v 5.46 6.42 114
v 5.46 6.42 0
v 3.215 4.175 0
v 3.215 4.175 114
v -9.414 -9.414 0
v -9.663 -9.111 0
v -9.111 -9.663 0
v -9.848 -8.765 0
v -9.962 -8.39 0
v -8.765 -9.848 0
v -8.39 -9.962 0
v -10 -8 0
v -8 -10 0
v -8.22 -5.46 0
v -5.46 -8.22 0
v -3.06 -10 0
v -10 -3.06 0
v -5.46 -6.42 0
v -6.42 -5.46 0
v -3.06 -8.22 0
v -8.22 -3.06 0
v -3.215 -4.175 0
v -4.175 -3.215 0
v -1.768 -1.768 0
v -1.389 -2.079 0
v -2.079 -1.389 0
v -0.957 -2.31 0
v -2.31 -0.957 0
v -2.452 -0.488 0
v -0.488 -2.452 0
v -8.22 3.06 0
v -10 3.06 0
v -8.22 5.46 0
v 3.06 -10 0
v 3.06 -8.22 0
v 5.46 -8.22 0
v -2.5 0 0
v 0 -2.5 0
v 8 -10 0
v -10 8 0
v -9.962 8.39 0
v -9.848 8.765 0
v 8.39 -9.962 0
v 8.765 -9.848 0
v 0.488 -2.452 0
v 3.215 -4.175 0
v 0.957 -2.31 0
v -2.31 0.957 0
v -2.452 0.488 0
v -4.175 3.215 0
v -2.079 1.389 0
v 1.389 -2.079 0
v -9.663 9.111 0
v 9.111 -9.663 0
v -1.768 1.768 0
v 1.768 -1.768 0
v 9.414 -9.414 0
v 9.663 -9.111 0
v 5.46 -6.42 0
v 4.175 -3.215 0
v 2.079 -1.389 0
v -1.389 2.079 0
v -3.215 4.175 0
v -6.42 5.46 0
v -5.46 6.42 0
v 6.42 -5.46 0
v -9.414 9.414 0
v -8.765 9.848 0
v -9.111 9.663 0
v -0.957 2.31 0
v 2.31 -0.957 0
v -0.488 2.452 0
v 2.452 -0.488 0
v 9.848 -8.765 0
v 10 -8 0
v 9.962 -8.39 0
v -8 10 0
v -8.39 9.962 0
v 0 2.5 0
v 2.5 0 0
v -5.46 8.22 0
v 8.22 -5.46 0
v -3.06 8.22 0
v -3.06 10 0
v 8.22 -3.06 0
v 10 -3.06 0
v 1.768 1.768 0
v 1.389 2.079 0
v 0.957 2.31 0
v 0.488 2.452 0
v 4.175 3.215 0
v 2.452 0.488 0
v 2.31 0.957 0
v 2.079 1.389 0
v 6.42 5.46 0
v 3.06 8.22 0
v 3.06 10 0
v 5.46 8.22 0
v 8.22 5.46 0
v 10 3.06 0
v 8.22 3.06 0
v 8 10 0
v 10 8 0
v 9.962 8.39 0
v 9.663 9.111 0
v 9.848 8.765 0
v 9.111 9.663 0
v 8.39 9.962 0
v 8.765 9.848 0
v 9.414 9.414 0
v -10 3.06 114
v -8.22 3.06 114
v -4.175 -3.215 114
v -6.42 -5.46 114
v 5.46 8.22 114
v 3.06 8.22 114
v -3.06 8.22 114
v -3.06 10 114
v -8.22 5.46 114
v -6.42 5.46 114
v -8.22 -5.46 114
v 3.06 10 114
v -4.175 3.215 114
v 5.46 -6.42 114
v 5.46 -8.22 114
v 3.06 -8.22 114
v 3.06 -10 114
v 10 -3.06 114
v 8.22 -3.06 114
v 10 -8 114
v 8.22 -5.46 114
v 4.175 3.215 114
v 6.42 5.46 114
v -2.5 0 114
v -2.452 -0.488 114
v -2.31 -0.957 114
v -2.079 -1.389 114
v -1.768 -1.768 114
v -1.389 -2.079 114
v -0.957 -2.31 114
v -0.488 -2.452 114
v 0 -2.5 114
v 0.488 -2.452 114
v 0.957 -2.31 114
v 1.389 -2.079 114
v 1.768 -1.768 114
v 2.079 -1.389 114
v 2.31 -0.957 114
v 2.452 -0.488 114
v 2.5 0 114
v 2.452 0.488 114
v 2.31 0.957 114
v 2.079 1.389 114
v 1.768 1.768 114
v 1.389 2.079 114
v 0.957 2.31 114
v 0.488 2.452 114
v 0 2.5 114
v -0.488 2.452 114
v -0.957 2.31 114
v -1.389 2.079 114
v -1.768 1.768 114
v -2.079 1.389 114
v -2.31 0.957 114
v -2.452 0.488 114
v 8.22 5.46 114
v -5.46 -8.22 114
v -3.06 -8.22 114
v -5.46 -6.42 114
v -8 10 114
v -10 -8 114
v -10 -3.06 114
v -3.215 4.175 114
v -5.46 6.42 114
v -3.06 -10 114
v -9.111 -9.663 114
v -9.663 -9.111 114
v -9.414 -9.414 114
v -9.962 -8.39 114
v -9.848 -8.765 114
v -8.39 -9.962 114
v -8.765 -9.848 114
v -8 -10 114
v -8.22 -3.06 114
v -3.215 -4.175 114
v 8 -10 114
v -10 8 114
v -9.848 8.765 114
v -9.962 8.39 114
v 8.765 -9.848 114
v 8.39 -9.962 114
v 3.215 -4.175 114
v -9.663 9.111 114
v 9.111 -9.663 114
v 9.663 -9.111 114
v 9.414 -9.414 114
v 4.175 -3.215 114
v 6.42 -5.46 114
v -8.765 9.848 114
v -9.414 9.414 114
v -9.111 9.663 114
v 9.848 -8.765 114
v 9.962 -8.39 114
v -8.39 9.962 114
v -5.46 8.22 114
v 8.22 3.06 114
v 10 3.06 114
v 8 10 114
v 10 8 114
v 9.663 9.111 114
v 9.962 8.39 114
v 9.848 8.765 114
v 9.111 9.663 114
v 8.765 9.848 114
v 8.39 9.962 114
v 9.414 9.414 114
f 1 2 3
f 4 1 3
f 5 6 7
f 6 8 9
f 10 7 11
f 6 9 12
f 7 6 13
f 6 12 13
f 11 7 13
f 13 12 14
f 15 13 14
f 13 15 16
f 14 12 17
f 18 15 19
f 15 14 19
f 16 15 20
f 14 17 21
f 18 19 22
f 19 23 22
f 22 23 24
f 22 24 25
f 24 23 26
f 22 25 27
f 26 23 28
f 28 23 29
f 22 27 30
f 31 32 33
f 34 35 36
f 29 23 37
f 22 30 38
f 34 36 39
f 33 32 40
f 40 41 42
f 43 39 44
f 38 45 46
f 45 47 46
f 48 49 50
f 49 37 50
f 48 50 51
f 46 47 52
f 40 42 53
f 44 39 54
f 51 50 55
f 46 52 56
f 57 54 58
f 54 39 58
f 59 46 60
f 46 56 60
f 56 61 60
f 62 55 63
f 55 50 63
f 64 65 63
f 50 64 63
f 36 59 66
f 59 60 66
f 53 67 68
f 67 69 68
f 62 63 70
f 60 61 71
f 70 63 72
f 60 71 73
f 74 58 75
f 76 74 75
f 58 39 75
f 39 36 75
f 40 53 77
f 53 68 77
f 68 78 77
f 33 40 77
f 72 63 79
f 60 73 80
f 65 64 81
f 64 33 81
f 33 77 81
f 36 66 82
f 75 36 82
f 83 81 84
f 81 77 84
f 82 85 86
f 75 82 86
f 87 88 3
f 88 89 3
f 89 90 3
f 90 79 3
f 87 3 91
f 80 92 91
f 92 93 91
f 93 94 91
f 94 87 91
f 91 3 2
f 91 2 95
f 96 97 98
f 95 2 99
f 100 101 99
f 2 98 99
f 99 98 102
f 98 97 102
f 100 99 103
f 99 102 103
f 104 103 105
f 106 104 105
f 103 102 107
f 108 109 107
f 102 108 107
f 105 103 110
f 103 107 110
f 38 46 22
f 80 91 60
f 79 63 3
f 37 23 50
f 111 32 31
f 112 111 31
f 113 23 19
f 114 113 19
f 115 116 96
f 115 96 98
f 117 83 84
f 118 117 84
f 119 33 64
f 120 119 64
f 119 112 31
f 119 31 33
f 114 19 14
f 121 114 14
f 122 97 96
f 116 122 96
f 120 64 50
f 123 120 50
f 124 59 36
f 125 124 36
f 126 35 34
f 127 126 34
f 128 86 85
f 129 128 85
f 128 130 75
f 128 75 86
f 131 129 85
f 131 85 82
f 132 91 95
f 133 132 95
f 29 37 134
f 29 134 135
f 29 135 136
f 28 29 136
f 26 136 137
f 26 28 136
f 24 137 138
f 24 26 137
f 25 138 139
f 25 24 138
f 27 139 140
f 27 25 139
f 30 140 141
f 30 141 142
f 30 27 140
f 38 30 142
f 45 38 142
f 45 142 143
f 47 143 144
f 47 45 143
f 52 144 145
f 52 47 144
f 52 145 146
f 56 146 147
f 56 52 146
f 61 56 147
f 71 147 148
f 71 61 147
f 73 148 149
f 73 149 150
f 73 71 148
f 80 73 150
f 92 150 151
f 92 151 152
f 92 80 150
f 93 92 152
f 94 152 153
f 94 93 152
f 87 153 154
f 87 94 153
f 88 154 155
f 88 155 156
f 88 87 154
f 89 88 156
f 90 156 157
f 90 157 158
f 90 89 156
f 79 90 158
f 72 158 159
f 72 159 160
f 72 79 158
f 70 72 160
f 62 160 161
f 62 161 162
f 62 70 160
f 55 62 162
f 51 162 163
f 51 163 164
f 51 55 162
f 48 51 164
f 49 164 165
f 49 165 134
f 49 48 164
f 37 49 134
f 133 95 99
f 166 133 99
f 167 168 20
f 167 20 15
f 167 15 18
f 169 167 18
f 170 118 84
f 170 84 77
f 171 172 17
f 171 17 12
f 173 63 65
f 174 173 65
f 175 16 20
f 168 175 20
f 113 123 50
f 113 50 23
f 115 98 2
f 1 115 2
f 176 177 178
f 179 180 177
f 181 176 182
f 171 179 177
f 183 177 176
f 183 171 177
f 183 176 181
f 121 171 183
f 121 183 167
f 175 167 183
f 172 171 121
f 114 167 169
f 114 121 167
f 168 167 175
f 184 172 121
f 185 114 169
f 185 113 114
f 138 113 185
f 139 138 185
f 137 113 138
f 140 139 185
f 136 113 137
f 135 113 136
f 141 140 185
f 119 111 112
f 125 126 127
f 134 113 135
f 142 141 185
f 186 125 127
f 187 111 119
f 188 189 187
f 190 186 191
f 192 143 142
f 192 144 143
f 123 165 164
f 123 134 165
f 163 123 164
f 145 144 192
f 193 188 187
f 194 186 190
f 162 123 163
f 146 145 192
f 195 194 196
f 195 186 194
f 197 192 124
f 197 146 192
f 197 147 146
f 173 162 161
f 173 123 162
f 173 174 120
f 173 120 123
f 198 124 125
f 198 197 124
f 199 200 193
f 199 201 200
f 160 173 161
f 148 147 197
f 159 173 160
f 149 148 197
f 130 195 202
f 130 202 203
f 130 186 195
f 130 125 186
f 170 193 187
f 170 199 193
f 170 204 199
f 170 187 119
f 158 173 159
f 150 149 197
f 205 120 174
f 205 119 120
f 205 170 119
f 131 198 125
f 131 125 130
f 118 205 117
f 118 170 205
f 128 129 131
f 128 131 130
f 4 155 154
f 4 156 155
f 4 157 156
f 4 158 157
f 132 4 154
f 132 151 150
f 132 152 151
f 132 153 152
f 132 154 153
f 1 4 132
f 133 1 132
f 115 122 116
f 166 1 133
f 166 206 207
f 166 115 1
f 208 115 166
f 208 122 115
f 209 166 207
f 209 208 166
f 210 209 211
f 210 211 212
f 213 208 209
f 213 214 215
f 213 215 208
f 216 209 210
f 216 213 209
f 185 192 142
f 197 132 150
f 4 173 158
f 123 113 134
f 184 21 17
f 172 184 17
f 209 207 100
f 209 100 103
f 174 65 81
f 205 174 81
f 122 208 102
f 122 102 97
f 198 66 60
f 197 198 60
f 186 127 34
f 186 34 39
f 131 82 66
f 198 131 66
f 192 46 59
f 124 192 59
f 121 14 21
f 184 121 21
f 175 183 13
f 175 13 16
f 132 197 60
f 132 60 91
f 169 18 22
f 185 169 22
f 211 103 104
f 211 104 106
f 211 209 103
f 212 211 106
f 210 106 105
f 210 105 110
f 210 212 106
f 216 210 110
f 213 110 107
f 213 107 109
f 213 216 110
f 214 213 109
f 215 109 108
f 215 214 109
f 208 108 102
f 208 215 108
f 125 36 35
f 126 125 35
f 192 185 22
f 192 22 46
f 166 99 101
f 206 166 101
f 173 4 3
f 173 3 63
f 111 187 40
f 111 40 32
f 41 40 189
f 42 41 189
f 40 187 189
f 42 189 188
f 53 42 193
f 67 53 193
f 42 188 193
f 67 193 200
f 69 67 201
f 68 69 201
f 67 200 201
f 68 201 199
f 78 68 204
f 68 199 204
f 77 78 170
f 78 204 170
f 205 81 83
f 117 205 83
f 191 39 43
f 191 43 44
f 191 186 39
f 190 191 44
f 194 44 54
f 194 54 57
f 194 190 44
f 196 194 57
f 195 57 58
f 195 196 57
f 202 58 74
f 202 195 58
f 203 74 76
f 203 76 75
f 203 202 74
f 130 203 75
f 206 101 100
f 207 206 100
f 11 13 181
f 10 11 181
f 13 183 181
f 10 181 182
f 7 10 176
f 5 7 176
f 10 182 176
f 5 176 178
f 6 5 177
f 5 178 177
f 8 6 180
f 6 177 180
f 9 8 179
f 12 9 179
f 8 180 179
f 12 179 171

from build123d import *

# Parameters (mm, degrees)
SKETCH1_R           = 2.5
BOSS_EXTRUDE1_DEPTH = 114
FILLET1_R           = 2


with BuildPart() as part:
    # Sketch1 → Boss-Extrude1 (new body)
    with BuildSketch(Plane.XY):
        Polygon((-5.46, -6.42), (-3.215, -4.175), (3.215, -4.175), (5.46, -6.42), (5.46, -8.22), (3.06, -8.22), (3.06, -10), (10, -10), (10, -3.06), (8.22, -3.06), (8.22, -5.46), (6.42, -5.46), (4.175, -3.215), (4.175, 3.215), (6.42, 5.46), (8.22, 5.46), (8.22, 3.06), (10, 3.06), (10, 10), (3.06, 10), (3.06, 8.22), (5.46, 8.22), (5.46, 6.42), (3.215, 4.175), (-3.215, 4.175), (-5.46, 6.42), (-5.46, 8.22), (-3.06, 8.22), (-3.06, 10), (-10, 10), (-10, 3.06), (-8.22, 3.06), (-8.22, 5.46), (-6.42, 5.46), (-4.175, 3.215), (-4.175, -3.215), (-6.42, -5.46), (-8.22, -5.46), (-8.22, -3.06), (-10, -3.06), (-10, -10), (-3.06, -10), (-3.06, -8.22), (-5.46, -8.22), align=None)
        with Locations(Location((0, 0, 0), (0, 0, 180))):
            Circle(SKETCH1_R, mode=Mode.SUBTRACT)
    extrude(amount=BOSS_EXTRUDE1_DEPTH)

    # Fillet1
    fillet1_edges = [part.edges().sort_by_distance(p)[0] for p in [
        (10, -10, 57),
        (-10, -10, 57),
        (-10, 10, 57),
        (10, 10, 57),
    ]]
    fillet(fillet1_edges, radius=FILLET1_R)


solid = part.part
